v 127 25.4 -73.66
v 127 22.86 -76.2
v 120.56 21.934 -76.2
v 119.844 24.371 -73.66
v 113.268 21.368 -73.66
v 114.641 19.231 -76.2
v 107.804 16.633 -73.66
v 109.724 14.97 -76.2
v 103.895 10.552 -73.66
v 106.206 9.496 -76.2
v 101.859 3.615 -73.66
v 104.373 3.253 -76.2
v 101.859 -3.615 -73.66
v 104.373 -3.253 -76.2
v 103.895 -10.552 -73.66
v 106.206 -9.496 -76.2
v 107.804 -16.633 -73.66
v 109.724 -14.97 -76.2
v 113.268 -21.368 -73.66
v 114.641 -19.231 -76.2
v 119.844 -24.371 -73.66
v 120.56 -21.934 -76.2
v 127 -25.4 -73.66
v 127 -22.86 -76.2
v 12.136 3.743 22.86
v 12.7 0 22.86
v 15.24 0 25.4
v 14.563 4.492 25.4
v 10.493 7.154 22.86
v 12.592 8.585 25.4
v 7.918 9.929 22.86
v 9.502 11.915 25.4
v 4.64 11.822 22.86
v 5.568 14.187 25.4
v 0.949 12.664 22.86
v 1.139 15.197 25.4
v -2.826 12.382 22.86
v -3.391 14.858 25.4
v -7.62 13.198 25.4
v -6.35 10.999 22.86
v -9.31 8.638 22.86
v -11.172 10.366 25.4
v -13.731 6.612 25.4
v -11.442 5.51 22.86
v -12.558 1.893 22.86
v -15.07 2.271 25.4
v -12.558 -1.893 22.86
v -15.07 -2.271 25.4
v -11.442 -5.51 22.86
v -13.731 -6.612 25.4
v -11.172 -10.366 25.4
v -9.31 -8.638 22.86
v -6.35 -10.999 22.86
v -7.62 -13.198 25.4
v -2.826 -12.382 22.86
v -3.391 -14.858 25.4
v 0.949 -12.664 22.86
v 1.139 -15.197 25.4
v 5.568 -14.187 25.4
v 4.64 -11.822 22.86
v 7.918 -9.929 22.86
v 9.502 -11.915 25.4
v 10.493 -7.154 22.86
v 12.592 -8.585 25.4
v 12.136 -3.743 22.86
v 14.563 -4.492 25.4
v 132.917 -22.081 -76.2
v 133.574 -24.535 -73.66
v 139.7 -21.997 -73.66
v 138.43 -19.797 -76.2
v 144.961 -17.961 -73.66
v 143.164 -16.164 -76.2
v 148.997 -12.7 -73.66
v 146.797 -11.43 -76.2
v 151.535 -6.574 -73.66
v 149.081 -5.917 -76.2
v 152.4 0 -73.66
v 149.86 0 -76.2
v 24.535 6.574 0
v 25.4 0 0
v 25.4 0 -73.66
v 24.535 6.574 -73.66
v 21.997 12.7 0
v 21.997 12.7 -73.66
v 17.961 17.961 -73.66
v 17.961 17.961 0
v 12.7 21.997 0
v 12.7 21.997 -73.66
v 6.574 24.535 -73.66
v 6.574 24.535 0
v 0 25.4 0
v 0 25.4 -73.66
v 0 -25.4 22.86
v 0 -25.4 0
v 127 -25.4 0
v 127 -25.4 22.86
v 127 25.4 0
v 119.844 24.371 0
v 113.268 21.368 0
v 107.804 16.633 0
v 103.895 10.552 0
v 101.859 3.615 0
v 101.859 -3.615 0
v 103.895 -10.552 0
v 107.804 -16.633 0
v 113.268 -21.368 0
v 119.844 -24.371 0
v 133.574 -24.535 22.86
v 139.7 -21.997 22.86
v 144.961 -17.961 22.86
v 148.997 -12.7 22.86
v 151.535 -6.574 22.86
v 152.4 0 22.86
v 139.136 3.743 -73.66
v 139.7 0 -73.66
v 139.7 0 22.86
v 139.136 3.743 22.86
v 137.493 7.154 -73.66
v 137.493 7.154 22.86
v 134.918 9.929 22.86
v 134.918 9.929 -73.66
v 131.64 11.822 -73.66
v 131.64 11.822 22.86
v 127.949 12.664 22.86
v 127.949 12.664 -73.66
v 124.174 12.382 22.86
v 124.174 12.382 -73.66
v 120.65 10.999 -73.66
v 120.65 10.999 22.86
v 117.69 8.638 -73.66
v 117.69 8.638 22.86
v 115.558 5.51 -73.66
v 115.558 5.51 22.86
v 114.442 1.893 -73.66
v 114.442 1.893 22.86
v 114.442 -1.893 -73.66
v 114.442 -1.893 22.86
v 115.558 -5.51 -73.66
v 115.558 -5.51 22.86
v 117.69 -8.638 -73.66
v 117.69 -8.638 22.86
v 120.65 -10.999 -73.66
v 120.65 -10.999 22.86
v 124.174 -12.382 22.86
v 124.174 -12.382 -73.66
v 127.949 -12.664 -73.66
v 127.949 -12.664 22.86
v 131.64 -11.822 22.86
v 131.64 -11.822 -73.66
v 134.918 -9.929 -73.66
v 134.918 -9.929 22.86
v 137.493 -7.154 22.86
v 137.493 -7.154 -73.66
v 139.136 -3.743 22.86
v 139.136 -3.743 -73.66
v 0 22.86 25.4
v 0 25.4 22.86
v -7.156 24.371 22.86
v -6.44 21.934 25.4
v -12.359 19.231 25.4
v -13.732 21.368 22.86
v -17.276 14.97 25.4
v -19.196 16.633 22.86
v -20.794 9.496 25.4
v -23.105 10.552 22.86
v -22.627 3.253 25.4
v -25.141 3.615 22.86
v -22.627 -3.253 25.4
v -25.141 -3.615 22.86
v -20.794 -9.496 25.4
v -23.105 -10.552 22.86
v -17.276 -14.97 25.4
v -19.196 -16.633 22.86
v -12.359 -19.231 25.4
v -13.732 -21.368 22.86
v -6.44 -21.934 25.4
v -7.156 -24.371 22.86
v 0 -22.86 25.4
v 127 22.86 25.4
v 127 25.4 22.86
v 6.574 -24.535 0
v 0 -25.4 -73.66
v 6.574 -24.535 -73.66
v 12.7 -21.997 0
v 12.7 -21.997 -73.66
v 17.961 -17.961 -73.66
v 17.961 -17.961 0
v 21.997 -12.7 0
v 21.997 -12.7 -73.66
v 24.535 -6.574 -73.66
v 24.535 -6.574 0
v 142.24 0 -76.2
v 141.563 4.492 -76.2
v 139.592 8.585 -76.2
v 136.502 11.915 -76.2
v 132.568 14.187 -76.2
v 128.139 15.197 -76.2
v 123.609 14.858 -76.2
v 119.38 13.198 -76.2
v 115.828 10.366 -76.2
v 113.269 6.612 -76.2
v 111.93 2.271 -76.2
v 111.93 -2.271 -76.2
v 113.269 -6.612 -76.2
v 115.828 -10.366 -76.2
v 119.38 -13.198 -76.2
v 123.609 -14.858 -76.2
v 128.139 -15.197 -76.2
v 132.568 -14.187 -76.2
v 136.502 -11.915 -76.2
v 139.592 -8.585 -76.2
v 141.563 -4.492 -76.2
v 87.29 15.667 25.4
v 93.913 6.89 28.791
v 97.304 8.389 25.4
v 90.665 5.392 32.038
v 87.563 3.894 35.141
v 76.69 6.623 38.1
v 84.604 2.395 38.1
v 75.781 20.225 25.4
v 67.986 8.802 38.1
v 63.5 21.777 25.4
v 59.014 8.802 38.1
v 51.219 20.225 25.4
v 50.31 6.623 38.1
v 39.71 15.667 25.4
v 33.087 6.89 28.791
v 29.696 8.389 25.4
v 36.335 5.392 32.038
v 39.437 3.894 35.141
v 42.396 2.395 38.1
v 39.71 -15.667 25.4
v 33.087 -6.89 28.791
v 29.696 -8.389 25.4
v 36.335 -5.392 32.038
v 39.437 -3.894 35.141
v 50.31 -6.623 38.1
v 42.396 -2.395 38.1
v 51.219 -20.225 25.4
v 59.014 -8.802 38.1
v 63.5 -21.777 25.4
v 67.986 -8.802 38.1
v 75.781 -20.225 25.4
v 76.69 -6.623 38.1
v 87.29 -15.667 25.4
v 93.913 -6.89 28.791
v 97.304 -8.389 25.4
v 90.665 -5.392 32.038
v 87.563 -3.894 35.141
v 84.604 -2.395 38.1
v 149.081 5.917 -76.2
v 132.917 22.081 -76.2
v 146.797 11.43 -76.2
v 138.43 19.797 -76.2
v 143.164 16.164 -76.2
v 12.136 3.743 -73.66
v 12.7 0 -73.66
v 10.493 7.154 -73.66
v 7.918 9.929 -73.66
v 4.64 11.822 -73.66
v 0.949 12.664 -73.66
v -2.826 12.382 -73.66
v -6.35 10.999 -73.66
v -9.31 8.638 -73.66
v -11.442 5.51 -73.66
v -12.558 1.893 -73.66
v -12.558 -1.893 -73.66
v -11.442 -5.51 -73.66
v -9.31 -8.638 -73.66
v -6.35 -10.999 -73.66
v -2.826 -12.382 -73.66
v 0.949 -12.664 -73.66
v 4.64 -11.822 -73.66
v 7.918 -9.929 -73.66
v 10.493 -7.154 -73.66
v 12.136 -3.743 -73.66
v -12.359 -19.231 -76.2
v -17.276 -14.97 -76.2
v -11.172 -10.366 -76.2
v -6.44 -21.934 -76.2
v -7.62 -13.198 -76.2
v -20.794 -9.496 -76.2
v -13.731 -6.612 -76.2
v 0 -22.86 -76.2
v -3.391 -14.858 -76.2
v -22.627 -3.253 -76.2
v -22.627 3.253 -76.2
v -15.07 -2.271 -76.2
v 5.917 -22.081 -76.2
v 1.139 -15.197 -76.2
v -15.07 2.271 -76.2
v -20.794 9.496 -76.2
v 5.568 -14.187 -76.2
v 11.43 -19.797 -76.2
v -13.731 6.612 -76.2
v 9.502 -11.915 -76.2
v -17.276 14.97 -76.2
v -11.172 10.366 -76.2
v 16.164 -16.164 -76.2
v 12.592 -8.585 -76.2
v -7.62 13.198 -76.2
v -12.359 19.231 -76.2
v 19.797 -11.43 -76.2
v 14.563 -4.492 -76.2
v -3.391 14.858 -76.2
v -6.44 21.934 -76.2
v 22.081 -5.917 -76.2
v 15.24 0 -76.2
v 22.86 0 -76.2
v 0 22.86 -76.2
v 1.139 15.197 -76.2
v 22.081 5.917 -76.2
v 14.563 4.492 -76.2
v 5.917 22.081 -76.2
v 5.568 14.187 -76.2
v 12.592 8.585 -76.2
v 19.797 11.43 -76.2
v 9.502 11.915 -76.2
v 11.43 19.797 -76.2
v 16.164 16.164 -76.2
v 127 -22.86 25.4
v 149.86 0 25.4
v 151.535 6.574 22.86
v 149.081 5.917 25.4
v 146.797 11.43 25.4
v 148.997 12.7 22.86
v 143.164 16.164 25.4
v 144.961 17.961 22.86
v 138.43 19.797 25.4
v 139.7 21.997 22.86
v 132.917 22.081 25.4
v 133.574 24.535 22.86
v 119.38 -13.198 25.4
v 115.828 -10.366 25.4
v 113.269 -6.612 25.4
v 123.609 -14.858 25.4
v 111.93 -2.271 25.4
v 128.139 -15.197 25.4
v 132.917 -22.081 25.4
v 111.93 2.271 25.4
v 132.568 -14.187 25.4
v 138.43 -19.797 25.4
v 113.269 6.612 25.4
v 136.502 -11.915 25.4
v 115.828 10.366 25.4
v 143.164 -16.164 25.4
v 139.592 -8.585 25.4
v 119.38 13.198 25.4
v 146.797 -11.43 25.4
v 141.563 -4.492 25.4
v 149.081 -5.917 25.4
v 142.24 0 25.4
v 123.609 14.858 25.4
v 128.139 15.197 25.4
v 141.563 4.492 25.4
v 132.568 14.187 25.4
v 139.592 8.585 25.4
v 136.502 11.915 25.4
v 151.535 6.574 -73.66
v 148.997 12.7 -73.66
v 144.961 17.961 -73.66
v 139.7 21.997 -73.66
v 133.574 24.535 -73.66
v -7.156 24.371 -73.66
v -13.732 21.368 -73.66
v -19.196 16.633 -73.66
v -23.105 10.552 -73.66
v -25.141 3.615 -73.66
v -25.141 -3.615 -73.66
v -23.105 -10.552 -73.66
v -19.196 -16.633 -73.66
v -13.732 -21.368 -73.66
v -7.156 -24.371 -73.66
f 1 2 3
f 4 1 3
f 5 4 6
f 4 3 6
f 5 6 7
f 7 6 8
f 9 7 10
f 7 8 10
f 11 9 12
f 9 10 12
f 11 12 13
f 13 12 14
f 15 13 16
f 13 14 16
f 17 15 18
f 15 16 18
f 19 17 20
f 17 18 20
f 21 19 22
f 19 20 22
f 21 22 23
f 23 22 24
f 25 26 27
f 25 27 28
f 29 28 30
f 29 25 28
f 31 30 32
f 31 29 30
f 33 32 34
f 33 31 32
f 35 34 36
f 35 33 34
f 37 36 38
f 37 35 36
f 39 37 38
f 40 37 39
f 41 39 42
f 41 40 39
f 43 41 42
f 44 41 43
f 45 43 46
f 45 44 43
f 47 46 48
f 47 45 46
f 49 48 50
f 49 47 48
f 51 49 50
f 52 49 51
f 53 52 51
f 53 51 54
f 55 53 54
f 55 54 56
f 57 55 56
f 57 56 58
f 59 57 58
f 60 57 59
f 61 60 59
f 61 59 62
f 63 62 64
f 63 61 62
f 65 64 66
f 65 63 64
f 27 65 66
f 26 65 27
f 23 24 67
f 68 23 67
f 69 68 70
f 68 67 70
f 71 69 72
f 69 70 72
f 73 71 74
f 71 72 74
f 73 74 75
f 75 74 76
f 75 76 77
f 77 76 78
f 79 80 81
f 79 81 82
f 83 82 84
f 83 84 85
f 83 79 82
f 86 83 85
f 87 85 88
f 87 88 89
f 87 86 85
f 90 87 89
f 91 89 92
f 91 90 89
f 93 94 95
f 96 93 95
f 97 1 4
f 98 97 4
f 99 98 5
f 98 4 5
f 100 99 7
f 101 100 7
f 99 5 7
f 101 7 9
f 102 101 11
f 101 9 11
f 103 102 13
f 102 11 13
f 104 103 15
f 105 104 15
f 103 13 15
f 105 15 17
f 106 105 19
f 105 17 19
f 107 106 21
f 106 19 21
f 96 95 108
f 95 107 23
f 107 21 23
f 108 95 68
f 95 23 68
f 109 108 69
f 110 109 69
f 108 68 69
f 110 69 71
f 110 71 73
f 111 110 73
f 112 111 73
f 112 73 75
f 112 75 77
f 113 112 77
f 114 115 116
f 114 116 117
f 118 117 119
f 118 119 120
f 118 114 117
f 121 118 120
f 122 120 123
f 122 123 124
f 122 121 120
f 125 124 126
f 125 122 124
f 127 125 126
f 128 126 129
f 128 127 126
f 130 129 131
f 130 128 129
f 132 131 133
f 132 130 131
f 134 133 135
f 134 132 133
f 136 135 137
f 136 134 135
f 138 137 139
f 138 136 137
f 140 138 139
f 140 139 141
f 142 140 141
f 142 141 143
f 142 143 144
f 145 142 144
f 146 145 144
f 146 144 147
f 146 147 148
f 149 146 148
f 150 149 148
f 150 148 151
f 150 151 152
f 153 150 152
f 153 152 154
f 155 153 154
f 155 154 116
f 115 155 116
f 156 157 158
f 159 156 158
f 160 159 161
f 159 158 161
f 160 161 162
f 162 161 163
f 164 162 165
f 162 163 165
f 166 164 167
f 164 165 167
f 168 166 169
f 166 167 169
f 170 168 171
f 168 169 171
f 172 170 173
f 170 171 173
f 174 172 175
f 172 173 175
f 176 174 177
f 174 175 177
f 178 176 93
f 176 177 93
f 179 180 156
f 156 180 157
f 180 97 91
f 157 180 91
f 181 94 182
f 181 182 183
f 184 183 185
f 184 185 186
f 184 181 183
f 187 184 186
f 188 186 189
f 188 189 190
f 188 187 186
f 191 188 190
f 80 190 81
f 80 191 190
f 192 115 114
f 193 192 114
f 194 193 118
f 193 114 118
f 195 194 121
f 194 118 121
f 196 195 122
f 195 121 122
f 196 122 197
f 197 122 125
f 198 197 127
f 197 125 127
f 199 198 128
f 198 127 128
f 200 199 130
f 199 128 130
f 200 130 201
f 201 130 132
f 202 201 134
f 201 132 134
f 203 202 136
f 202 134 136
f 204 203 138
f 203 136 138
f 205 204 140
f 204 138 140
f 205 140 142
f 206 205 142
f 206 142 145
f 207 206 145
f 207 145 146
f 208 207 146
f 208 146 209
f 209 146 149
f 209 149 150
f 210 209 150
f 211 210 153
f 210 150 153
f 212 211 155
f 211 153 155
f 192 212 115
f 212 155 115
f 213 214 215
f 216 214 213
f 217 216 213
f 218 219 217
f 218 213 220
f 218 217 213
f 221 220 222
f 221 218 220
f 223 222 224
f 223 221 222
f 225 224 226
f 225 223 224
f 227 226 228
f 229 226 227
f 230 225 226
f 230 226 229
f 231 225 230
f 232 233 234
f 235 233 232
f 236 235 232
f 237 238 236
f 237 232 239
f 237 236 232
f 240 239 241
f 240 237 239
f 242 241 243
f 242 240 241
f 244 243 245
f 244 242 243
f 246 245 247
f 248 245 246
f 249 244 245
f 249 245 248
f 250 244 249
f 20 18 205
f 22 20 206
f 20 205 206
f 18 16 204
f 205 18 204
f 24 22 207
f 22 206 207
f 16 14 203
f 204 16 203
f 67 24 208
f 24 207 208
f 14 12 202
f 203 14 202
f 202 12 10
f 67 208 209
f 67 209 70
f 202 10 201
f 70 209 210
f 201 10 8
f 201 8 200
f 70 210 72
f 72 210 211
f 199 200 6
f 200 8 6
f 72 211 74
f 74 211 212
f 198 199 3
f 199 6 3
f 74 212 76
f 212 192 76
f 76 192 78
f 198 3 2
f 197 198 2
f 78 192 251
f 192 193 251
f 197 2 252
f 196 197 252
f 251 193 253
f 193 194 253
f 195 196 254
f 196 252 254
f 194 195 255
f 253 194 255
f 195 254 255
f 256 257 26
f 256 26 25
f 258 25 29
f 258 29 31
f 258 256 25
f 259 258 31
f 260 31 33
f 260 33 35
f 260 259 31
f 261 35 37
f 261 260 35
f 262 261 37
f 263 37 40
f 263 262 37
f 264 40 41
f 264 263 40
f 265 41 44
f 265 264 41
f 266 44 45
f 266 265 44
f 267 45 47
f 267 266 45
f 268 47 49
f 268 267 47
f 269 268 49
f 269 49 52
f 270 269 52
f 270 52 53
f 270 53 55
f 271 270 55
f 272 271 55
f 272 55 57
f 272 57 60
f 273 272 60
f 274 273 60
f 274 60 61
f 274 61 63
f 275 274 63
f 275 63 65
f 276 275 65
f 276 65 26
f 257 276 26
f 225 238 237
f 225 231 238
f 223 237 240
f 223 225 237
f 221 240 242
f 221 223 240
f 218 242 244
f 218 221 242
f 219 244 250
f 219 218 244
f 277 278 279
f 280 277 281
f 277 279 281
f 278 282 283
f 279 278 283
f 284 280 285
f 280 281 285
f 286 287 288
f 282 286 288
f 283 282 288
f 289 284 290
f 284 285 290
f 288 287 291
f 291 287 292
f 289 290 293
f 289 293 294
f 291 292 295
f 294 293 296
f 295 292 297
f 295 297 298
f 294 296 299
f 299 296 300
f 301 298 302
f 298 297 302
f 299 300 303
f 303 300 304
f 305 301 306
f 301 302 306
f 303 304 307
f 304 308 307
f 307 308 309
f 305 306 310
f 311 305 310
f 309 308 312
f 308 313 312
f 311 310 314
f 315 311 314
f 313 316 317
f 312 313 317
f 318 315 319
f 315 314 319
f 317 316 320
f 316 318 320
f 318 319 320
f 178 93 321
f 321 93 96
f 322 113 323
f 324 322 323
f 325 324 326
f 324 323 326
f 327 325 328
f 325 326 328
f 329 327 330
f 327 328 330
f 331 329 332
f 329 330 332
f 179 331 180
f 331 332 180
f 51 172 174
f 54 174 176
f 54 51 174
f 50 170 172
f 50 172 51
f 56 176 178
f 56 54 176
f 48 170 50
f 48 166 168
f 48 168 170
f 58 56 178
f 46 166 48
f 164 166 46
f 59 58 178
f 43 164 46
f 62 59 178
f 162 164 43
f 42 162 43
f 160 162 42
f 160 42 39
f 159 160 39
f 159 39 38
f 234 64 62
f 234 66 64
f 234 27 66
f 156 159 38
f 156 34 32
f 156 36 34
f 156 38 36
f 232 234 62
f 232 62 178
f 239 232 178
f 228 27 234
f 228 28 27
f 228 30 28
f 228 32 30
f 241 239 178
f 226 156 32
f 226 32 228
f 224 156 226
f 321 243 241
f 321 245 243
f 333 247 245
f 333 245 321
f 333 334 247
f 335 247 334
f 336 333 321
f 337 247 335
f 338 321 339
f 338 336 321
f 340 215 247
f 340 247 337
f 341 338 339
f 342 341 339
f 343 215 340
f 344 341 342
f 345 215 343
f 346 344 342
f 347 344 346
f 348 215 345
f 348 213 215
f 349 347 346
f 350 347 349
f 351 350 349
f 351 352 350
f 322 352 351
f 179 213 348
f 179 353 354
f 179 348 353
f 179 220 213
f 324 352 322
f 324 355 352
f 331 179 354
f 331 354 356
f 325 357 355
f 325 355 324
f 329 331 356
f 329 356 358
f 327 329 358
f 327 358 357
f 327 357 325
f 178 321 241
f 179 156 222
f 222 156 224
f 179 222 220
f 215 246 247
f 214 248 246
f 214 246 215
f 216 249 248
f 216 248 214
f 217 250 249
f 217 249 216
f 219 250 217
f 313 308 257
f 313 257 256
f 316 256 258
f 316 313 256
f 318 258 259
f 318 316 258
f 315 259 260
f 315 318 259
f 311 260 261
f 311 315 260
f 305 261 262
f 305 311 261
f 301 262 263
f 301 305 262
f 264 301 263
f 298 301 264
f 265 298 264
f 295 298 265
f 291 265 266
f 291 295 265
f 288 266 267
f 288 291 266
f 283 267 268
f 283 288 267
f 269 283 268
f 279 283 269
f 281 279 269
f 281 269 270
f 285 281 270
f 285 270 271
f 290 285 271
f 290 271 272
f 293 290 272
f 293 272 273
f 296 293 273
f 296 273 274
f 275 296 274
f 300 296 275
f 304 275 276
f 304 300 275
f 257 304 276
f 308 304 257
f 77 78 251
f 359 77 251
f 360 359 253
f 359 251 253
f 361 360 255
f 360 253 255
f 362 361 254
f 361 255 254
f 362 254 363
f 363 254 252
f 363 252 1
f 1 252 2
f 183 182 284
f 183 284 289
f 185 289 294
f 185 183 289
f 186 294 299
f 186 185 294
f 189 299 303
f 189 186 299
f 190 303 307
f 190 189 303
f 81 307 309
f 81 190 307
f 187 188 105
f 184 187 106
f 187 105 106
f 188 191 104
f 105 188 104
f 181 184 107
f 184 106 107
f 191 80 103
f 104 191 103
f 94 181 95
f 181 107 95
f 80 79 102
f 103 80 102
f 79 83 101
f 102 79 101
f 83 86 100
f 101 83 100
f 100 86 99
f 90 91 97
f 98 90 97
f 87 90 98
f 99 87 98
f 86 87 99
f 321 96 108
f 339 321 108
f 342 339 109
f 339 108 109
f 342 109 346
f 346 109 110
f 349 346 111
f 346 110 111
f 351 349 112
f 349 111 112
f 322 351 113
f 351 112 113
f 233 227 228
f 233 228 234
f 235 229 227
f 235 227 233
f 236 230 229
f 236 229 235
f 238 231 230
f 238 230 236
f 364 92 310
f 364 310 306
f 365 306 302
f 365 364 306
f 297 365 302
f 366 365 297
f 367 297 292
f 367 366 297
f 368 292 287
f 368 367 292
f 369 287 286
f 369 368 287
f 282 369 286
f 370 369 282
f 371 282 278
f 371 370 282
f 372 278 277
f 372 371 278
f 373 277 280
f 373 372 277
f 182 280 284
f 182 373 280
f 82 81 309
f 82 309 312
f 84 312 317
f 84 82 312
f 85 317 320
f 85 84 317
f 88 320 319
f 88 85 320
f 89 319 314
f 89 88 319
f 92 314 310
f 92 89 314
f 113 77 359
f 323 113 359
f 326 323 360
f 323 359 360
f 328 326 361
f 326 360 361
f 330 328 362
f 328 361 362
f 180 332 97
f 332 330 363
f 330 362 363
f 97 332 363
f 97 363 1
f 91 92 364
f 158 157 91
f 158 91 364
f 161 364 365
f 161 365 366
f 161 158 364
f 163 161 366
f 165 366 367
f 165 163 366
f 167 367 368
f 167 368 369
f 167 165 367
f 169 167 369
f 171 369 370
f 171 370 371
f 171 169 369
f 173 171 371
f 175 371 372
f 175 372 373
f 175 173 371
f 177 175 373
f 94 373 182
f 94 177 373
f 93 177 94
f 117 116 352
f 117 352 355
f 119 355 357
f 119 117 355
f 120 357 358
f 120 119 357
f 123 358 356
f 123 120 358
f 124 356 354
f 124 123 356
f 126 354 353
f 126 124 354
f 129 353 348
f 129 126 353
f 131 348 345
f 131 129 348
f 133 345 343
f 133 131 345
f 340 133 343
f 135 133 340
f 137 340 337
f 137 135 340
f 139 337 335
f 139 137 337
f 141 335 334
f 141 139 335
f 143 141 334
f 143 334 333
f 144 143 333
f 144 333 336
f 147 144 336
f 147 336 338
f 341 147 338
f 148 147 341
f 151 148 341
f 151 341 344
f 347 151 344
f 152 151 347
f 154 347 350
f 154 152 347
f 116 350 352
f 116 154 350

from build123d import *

# Parameters (mm, degrees)
F0_R     = 12.7
F1_DEPTH = 25.4
F2_DEPTH = 76.2
F5_DEPTH = 12.7
F6_SIZE  = 12.69999
F7_SIZE  = 2.54
F8_SIZE  = 2.54
F9_SIZE  = 2.54


# Not quite as in the source:
# - a fillet or chamfer is up to 0.001 mm smaller than in the source, because OpenCascade refuses the exact size


with BuildPart() as f1:
    # F0 (on Top) → F1 (new body)
    with BuildSketch(Plane.XY):
        with BuildLine():
            ThreePointArc((0, -25.4), (17.9605122421, -17.9605122421), (25.4, 0))
            ThreePointArc((25.4, 0), (17.9605122421, 17.9605122421), (0, 25.4))
            ThreePointArc((0, 25.4), (-25.4, 0), (0, -25.4))
        make_face()
        Circle(F0_R, mode=Mode.SUBTRACT)
        with BuildLine():
            ThreePointArc((0, 25.4), (17.9605122421, 17.9605122421), (25.4, 0))
            ThreePointArc((25.4, 0), (17.9605122421, -17.9605122421), (0, -25.4))
            Line((0, -25.4), (127, -25.4))
            ThreePointArc((127, -25.4), (101.6, 0), (127, 25.4))
            Line((127, 25.4), (0, 25.4))
        make_face()
        with BuildLine():
            ThreePointArc((152.4, 0), (144.9605122421, 17.9605122421), (127, 25.4))
            ThreePointArc((127, 25.4), (101.6, 0), (127, -25.4))
            ThreePointArc((127, -25.4), (144.9605122421, -17.9605122421), (152.4, 0))
        make_face()
        with Locations((127, 0)):
            Circle(F0_R, mode=Mode.SUBTRACT)
    extrude(amount=F1_DEPTH)

    # F0 (on Top) → F2 (join)
    with BuildSketch(Plane.XY):
        with BuildLine():
            ThreePointArc((0, -25.4), (17.9605122421, -17.9605122421), (25.4, 0))
            ThreePointArc((25.4, 0), (17.9605122421, 17.9605122421), (0, 25.4))
            ThreePointArc((0, 25.4), (-25.4, 0), (0, -25.4))
        make_face()
        Circle(F0_R, mode=Mode.SUBTRACT)
        with BuildLine():
            ThreePointArc((152.4, 0), (144.9605122421, 17.9605122421), (127, 25.4))
            ThreePointArc((127, 25.4), (101.6, 0), (127, -25.4))
            ThreePointArc((127, -25.4), (144.9605122421, -17.9605122421), (152.4, 0))
        make_face()
        with Locations((127, 0)):
            Circle(F0_R, mode=Mode.SUBTRACT)
    extrude(amount=-F2_DEPTH)

    # F4 (on face) → F5 (join)
    with BuildSketch(Plane.XY.offset(25.4)):
        with BuildLine():
            ThreePointArc((29.6961453219, -8.3886324314), (63.5, -21.7770315987), (97.3038546781, -8.3886324314))
            Line((97.3038546781, -8.3886324314), (97.3038546781, 8.3886324314))
            ThreePointArc((97.3038546781, 8.3886324314), (63.5, 21.7770315987), (29.6961453219, 8.3886324314))
            Line((29.6961453219, 8.3886324314), (29.6961453219, -8.3886324314))
        make_face()
    extrude(amount=F5_DEPTH)

    # F6 (size 12.7 in the source; OpenCascade refuses exactly that, so slightly less here)
    f6_edges = [f1.edges().sort_by_distance(p)[0] for p in [
        (63.5, -21.777032, 38.1),
        (97.303855, 0, 38.1),
        (63.5, 21.777032, 38.1),
        (29.696145, 0, 38.1),
    ]]
    chamfer(f6_edges, length=F6_SIZE)

    # F7
    f7_edges = [f1.edges().sort_by_distance(p)[0] for p in [
        (114.3, 0, 25.4),
        (-12.7, 0, 25.4),
    ]]
    chamfer(f7_edges, length=F7_SIZE)

    # F8
    f8_edges = [f1.edges().sort_by_distance(p)[0] for p in [
        (114.3, 0, -76.2),
        (127, -25.4, -76.2),
        (-25.4, 0, -76.2),
        (-12.7, 0, -76.2),
    ]]
    chamfer(f8_edges, length=F8_SIZE)

    # F9
    f9_edges = [f1.edges().sort_by_distance(p)[0] for p in [
        (63.5, -25.4, 25.4),
    ]]
    chamfer(f9_edges, length=F9_SIZE)


solid = f1.part
